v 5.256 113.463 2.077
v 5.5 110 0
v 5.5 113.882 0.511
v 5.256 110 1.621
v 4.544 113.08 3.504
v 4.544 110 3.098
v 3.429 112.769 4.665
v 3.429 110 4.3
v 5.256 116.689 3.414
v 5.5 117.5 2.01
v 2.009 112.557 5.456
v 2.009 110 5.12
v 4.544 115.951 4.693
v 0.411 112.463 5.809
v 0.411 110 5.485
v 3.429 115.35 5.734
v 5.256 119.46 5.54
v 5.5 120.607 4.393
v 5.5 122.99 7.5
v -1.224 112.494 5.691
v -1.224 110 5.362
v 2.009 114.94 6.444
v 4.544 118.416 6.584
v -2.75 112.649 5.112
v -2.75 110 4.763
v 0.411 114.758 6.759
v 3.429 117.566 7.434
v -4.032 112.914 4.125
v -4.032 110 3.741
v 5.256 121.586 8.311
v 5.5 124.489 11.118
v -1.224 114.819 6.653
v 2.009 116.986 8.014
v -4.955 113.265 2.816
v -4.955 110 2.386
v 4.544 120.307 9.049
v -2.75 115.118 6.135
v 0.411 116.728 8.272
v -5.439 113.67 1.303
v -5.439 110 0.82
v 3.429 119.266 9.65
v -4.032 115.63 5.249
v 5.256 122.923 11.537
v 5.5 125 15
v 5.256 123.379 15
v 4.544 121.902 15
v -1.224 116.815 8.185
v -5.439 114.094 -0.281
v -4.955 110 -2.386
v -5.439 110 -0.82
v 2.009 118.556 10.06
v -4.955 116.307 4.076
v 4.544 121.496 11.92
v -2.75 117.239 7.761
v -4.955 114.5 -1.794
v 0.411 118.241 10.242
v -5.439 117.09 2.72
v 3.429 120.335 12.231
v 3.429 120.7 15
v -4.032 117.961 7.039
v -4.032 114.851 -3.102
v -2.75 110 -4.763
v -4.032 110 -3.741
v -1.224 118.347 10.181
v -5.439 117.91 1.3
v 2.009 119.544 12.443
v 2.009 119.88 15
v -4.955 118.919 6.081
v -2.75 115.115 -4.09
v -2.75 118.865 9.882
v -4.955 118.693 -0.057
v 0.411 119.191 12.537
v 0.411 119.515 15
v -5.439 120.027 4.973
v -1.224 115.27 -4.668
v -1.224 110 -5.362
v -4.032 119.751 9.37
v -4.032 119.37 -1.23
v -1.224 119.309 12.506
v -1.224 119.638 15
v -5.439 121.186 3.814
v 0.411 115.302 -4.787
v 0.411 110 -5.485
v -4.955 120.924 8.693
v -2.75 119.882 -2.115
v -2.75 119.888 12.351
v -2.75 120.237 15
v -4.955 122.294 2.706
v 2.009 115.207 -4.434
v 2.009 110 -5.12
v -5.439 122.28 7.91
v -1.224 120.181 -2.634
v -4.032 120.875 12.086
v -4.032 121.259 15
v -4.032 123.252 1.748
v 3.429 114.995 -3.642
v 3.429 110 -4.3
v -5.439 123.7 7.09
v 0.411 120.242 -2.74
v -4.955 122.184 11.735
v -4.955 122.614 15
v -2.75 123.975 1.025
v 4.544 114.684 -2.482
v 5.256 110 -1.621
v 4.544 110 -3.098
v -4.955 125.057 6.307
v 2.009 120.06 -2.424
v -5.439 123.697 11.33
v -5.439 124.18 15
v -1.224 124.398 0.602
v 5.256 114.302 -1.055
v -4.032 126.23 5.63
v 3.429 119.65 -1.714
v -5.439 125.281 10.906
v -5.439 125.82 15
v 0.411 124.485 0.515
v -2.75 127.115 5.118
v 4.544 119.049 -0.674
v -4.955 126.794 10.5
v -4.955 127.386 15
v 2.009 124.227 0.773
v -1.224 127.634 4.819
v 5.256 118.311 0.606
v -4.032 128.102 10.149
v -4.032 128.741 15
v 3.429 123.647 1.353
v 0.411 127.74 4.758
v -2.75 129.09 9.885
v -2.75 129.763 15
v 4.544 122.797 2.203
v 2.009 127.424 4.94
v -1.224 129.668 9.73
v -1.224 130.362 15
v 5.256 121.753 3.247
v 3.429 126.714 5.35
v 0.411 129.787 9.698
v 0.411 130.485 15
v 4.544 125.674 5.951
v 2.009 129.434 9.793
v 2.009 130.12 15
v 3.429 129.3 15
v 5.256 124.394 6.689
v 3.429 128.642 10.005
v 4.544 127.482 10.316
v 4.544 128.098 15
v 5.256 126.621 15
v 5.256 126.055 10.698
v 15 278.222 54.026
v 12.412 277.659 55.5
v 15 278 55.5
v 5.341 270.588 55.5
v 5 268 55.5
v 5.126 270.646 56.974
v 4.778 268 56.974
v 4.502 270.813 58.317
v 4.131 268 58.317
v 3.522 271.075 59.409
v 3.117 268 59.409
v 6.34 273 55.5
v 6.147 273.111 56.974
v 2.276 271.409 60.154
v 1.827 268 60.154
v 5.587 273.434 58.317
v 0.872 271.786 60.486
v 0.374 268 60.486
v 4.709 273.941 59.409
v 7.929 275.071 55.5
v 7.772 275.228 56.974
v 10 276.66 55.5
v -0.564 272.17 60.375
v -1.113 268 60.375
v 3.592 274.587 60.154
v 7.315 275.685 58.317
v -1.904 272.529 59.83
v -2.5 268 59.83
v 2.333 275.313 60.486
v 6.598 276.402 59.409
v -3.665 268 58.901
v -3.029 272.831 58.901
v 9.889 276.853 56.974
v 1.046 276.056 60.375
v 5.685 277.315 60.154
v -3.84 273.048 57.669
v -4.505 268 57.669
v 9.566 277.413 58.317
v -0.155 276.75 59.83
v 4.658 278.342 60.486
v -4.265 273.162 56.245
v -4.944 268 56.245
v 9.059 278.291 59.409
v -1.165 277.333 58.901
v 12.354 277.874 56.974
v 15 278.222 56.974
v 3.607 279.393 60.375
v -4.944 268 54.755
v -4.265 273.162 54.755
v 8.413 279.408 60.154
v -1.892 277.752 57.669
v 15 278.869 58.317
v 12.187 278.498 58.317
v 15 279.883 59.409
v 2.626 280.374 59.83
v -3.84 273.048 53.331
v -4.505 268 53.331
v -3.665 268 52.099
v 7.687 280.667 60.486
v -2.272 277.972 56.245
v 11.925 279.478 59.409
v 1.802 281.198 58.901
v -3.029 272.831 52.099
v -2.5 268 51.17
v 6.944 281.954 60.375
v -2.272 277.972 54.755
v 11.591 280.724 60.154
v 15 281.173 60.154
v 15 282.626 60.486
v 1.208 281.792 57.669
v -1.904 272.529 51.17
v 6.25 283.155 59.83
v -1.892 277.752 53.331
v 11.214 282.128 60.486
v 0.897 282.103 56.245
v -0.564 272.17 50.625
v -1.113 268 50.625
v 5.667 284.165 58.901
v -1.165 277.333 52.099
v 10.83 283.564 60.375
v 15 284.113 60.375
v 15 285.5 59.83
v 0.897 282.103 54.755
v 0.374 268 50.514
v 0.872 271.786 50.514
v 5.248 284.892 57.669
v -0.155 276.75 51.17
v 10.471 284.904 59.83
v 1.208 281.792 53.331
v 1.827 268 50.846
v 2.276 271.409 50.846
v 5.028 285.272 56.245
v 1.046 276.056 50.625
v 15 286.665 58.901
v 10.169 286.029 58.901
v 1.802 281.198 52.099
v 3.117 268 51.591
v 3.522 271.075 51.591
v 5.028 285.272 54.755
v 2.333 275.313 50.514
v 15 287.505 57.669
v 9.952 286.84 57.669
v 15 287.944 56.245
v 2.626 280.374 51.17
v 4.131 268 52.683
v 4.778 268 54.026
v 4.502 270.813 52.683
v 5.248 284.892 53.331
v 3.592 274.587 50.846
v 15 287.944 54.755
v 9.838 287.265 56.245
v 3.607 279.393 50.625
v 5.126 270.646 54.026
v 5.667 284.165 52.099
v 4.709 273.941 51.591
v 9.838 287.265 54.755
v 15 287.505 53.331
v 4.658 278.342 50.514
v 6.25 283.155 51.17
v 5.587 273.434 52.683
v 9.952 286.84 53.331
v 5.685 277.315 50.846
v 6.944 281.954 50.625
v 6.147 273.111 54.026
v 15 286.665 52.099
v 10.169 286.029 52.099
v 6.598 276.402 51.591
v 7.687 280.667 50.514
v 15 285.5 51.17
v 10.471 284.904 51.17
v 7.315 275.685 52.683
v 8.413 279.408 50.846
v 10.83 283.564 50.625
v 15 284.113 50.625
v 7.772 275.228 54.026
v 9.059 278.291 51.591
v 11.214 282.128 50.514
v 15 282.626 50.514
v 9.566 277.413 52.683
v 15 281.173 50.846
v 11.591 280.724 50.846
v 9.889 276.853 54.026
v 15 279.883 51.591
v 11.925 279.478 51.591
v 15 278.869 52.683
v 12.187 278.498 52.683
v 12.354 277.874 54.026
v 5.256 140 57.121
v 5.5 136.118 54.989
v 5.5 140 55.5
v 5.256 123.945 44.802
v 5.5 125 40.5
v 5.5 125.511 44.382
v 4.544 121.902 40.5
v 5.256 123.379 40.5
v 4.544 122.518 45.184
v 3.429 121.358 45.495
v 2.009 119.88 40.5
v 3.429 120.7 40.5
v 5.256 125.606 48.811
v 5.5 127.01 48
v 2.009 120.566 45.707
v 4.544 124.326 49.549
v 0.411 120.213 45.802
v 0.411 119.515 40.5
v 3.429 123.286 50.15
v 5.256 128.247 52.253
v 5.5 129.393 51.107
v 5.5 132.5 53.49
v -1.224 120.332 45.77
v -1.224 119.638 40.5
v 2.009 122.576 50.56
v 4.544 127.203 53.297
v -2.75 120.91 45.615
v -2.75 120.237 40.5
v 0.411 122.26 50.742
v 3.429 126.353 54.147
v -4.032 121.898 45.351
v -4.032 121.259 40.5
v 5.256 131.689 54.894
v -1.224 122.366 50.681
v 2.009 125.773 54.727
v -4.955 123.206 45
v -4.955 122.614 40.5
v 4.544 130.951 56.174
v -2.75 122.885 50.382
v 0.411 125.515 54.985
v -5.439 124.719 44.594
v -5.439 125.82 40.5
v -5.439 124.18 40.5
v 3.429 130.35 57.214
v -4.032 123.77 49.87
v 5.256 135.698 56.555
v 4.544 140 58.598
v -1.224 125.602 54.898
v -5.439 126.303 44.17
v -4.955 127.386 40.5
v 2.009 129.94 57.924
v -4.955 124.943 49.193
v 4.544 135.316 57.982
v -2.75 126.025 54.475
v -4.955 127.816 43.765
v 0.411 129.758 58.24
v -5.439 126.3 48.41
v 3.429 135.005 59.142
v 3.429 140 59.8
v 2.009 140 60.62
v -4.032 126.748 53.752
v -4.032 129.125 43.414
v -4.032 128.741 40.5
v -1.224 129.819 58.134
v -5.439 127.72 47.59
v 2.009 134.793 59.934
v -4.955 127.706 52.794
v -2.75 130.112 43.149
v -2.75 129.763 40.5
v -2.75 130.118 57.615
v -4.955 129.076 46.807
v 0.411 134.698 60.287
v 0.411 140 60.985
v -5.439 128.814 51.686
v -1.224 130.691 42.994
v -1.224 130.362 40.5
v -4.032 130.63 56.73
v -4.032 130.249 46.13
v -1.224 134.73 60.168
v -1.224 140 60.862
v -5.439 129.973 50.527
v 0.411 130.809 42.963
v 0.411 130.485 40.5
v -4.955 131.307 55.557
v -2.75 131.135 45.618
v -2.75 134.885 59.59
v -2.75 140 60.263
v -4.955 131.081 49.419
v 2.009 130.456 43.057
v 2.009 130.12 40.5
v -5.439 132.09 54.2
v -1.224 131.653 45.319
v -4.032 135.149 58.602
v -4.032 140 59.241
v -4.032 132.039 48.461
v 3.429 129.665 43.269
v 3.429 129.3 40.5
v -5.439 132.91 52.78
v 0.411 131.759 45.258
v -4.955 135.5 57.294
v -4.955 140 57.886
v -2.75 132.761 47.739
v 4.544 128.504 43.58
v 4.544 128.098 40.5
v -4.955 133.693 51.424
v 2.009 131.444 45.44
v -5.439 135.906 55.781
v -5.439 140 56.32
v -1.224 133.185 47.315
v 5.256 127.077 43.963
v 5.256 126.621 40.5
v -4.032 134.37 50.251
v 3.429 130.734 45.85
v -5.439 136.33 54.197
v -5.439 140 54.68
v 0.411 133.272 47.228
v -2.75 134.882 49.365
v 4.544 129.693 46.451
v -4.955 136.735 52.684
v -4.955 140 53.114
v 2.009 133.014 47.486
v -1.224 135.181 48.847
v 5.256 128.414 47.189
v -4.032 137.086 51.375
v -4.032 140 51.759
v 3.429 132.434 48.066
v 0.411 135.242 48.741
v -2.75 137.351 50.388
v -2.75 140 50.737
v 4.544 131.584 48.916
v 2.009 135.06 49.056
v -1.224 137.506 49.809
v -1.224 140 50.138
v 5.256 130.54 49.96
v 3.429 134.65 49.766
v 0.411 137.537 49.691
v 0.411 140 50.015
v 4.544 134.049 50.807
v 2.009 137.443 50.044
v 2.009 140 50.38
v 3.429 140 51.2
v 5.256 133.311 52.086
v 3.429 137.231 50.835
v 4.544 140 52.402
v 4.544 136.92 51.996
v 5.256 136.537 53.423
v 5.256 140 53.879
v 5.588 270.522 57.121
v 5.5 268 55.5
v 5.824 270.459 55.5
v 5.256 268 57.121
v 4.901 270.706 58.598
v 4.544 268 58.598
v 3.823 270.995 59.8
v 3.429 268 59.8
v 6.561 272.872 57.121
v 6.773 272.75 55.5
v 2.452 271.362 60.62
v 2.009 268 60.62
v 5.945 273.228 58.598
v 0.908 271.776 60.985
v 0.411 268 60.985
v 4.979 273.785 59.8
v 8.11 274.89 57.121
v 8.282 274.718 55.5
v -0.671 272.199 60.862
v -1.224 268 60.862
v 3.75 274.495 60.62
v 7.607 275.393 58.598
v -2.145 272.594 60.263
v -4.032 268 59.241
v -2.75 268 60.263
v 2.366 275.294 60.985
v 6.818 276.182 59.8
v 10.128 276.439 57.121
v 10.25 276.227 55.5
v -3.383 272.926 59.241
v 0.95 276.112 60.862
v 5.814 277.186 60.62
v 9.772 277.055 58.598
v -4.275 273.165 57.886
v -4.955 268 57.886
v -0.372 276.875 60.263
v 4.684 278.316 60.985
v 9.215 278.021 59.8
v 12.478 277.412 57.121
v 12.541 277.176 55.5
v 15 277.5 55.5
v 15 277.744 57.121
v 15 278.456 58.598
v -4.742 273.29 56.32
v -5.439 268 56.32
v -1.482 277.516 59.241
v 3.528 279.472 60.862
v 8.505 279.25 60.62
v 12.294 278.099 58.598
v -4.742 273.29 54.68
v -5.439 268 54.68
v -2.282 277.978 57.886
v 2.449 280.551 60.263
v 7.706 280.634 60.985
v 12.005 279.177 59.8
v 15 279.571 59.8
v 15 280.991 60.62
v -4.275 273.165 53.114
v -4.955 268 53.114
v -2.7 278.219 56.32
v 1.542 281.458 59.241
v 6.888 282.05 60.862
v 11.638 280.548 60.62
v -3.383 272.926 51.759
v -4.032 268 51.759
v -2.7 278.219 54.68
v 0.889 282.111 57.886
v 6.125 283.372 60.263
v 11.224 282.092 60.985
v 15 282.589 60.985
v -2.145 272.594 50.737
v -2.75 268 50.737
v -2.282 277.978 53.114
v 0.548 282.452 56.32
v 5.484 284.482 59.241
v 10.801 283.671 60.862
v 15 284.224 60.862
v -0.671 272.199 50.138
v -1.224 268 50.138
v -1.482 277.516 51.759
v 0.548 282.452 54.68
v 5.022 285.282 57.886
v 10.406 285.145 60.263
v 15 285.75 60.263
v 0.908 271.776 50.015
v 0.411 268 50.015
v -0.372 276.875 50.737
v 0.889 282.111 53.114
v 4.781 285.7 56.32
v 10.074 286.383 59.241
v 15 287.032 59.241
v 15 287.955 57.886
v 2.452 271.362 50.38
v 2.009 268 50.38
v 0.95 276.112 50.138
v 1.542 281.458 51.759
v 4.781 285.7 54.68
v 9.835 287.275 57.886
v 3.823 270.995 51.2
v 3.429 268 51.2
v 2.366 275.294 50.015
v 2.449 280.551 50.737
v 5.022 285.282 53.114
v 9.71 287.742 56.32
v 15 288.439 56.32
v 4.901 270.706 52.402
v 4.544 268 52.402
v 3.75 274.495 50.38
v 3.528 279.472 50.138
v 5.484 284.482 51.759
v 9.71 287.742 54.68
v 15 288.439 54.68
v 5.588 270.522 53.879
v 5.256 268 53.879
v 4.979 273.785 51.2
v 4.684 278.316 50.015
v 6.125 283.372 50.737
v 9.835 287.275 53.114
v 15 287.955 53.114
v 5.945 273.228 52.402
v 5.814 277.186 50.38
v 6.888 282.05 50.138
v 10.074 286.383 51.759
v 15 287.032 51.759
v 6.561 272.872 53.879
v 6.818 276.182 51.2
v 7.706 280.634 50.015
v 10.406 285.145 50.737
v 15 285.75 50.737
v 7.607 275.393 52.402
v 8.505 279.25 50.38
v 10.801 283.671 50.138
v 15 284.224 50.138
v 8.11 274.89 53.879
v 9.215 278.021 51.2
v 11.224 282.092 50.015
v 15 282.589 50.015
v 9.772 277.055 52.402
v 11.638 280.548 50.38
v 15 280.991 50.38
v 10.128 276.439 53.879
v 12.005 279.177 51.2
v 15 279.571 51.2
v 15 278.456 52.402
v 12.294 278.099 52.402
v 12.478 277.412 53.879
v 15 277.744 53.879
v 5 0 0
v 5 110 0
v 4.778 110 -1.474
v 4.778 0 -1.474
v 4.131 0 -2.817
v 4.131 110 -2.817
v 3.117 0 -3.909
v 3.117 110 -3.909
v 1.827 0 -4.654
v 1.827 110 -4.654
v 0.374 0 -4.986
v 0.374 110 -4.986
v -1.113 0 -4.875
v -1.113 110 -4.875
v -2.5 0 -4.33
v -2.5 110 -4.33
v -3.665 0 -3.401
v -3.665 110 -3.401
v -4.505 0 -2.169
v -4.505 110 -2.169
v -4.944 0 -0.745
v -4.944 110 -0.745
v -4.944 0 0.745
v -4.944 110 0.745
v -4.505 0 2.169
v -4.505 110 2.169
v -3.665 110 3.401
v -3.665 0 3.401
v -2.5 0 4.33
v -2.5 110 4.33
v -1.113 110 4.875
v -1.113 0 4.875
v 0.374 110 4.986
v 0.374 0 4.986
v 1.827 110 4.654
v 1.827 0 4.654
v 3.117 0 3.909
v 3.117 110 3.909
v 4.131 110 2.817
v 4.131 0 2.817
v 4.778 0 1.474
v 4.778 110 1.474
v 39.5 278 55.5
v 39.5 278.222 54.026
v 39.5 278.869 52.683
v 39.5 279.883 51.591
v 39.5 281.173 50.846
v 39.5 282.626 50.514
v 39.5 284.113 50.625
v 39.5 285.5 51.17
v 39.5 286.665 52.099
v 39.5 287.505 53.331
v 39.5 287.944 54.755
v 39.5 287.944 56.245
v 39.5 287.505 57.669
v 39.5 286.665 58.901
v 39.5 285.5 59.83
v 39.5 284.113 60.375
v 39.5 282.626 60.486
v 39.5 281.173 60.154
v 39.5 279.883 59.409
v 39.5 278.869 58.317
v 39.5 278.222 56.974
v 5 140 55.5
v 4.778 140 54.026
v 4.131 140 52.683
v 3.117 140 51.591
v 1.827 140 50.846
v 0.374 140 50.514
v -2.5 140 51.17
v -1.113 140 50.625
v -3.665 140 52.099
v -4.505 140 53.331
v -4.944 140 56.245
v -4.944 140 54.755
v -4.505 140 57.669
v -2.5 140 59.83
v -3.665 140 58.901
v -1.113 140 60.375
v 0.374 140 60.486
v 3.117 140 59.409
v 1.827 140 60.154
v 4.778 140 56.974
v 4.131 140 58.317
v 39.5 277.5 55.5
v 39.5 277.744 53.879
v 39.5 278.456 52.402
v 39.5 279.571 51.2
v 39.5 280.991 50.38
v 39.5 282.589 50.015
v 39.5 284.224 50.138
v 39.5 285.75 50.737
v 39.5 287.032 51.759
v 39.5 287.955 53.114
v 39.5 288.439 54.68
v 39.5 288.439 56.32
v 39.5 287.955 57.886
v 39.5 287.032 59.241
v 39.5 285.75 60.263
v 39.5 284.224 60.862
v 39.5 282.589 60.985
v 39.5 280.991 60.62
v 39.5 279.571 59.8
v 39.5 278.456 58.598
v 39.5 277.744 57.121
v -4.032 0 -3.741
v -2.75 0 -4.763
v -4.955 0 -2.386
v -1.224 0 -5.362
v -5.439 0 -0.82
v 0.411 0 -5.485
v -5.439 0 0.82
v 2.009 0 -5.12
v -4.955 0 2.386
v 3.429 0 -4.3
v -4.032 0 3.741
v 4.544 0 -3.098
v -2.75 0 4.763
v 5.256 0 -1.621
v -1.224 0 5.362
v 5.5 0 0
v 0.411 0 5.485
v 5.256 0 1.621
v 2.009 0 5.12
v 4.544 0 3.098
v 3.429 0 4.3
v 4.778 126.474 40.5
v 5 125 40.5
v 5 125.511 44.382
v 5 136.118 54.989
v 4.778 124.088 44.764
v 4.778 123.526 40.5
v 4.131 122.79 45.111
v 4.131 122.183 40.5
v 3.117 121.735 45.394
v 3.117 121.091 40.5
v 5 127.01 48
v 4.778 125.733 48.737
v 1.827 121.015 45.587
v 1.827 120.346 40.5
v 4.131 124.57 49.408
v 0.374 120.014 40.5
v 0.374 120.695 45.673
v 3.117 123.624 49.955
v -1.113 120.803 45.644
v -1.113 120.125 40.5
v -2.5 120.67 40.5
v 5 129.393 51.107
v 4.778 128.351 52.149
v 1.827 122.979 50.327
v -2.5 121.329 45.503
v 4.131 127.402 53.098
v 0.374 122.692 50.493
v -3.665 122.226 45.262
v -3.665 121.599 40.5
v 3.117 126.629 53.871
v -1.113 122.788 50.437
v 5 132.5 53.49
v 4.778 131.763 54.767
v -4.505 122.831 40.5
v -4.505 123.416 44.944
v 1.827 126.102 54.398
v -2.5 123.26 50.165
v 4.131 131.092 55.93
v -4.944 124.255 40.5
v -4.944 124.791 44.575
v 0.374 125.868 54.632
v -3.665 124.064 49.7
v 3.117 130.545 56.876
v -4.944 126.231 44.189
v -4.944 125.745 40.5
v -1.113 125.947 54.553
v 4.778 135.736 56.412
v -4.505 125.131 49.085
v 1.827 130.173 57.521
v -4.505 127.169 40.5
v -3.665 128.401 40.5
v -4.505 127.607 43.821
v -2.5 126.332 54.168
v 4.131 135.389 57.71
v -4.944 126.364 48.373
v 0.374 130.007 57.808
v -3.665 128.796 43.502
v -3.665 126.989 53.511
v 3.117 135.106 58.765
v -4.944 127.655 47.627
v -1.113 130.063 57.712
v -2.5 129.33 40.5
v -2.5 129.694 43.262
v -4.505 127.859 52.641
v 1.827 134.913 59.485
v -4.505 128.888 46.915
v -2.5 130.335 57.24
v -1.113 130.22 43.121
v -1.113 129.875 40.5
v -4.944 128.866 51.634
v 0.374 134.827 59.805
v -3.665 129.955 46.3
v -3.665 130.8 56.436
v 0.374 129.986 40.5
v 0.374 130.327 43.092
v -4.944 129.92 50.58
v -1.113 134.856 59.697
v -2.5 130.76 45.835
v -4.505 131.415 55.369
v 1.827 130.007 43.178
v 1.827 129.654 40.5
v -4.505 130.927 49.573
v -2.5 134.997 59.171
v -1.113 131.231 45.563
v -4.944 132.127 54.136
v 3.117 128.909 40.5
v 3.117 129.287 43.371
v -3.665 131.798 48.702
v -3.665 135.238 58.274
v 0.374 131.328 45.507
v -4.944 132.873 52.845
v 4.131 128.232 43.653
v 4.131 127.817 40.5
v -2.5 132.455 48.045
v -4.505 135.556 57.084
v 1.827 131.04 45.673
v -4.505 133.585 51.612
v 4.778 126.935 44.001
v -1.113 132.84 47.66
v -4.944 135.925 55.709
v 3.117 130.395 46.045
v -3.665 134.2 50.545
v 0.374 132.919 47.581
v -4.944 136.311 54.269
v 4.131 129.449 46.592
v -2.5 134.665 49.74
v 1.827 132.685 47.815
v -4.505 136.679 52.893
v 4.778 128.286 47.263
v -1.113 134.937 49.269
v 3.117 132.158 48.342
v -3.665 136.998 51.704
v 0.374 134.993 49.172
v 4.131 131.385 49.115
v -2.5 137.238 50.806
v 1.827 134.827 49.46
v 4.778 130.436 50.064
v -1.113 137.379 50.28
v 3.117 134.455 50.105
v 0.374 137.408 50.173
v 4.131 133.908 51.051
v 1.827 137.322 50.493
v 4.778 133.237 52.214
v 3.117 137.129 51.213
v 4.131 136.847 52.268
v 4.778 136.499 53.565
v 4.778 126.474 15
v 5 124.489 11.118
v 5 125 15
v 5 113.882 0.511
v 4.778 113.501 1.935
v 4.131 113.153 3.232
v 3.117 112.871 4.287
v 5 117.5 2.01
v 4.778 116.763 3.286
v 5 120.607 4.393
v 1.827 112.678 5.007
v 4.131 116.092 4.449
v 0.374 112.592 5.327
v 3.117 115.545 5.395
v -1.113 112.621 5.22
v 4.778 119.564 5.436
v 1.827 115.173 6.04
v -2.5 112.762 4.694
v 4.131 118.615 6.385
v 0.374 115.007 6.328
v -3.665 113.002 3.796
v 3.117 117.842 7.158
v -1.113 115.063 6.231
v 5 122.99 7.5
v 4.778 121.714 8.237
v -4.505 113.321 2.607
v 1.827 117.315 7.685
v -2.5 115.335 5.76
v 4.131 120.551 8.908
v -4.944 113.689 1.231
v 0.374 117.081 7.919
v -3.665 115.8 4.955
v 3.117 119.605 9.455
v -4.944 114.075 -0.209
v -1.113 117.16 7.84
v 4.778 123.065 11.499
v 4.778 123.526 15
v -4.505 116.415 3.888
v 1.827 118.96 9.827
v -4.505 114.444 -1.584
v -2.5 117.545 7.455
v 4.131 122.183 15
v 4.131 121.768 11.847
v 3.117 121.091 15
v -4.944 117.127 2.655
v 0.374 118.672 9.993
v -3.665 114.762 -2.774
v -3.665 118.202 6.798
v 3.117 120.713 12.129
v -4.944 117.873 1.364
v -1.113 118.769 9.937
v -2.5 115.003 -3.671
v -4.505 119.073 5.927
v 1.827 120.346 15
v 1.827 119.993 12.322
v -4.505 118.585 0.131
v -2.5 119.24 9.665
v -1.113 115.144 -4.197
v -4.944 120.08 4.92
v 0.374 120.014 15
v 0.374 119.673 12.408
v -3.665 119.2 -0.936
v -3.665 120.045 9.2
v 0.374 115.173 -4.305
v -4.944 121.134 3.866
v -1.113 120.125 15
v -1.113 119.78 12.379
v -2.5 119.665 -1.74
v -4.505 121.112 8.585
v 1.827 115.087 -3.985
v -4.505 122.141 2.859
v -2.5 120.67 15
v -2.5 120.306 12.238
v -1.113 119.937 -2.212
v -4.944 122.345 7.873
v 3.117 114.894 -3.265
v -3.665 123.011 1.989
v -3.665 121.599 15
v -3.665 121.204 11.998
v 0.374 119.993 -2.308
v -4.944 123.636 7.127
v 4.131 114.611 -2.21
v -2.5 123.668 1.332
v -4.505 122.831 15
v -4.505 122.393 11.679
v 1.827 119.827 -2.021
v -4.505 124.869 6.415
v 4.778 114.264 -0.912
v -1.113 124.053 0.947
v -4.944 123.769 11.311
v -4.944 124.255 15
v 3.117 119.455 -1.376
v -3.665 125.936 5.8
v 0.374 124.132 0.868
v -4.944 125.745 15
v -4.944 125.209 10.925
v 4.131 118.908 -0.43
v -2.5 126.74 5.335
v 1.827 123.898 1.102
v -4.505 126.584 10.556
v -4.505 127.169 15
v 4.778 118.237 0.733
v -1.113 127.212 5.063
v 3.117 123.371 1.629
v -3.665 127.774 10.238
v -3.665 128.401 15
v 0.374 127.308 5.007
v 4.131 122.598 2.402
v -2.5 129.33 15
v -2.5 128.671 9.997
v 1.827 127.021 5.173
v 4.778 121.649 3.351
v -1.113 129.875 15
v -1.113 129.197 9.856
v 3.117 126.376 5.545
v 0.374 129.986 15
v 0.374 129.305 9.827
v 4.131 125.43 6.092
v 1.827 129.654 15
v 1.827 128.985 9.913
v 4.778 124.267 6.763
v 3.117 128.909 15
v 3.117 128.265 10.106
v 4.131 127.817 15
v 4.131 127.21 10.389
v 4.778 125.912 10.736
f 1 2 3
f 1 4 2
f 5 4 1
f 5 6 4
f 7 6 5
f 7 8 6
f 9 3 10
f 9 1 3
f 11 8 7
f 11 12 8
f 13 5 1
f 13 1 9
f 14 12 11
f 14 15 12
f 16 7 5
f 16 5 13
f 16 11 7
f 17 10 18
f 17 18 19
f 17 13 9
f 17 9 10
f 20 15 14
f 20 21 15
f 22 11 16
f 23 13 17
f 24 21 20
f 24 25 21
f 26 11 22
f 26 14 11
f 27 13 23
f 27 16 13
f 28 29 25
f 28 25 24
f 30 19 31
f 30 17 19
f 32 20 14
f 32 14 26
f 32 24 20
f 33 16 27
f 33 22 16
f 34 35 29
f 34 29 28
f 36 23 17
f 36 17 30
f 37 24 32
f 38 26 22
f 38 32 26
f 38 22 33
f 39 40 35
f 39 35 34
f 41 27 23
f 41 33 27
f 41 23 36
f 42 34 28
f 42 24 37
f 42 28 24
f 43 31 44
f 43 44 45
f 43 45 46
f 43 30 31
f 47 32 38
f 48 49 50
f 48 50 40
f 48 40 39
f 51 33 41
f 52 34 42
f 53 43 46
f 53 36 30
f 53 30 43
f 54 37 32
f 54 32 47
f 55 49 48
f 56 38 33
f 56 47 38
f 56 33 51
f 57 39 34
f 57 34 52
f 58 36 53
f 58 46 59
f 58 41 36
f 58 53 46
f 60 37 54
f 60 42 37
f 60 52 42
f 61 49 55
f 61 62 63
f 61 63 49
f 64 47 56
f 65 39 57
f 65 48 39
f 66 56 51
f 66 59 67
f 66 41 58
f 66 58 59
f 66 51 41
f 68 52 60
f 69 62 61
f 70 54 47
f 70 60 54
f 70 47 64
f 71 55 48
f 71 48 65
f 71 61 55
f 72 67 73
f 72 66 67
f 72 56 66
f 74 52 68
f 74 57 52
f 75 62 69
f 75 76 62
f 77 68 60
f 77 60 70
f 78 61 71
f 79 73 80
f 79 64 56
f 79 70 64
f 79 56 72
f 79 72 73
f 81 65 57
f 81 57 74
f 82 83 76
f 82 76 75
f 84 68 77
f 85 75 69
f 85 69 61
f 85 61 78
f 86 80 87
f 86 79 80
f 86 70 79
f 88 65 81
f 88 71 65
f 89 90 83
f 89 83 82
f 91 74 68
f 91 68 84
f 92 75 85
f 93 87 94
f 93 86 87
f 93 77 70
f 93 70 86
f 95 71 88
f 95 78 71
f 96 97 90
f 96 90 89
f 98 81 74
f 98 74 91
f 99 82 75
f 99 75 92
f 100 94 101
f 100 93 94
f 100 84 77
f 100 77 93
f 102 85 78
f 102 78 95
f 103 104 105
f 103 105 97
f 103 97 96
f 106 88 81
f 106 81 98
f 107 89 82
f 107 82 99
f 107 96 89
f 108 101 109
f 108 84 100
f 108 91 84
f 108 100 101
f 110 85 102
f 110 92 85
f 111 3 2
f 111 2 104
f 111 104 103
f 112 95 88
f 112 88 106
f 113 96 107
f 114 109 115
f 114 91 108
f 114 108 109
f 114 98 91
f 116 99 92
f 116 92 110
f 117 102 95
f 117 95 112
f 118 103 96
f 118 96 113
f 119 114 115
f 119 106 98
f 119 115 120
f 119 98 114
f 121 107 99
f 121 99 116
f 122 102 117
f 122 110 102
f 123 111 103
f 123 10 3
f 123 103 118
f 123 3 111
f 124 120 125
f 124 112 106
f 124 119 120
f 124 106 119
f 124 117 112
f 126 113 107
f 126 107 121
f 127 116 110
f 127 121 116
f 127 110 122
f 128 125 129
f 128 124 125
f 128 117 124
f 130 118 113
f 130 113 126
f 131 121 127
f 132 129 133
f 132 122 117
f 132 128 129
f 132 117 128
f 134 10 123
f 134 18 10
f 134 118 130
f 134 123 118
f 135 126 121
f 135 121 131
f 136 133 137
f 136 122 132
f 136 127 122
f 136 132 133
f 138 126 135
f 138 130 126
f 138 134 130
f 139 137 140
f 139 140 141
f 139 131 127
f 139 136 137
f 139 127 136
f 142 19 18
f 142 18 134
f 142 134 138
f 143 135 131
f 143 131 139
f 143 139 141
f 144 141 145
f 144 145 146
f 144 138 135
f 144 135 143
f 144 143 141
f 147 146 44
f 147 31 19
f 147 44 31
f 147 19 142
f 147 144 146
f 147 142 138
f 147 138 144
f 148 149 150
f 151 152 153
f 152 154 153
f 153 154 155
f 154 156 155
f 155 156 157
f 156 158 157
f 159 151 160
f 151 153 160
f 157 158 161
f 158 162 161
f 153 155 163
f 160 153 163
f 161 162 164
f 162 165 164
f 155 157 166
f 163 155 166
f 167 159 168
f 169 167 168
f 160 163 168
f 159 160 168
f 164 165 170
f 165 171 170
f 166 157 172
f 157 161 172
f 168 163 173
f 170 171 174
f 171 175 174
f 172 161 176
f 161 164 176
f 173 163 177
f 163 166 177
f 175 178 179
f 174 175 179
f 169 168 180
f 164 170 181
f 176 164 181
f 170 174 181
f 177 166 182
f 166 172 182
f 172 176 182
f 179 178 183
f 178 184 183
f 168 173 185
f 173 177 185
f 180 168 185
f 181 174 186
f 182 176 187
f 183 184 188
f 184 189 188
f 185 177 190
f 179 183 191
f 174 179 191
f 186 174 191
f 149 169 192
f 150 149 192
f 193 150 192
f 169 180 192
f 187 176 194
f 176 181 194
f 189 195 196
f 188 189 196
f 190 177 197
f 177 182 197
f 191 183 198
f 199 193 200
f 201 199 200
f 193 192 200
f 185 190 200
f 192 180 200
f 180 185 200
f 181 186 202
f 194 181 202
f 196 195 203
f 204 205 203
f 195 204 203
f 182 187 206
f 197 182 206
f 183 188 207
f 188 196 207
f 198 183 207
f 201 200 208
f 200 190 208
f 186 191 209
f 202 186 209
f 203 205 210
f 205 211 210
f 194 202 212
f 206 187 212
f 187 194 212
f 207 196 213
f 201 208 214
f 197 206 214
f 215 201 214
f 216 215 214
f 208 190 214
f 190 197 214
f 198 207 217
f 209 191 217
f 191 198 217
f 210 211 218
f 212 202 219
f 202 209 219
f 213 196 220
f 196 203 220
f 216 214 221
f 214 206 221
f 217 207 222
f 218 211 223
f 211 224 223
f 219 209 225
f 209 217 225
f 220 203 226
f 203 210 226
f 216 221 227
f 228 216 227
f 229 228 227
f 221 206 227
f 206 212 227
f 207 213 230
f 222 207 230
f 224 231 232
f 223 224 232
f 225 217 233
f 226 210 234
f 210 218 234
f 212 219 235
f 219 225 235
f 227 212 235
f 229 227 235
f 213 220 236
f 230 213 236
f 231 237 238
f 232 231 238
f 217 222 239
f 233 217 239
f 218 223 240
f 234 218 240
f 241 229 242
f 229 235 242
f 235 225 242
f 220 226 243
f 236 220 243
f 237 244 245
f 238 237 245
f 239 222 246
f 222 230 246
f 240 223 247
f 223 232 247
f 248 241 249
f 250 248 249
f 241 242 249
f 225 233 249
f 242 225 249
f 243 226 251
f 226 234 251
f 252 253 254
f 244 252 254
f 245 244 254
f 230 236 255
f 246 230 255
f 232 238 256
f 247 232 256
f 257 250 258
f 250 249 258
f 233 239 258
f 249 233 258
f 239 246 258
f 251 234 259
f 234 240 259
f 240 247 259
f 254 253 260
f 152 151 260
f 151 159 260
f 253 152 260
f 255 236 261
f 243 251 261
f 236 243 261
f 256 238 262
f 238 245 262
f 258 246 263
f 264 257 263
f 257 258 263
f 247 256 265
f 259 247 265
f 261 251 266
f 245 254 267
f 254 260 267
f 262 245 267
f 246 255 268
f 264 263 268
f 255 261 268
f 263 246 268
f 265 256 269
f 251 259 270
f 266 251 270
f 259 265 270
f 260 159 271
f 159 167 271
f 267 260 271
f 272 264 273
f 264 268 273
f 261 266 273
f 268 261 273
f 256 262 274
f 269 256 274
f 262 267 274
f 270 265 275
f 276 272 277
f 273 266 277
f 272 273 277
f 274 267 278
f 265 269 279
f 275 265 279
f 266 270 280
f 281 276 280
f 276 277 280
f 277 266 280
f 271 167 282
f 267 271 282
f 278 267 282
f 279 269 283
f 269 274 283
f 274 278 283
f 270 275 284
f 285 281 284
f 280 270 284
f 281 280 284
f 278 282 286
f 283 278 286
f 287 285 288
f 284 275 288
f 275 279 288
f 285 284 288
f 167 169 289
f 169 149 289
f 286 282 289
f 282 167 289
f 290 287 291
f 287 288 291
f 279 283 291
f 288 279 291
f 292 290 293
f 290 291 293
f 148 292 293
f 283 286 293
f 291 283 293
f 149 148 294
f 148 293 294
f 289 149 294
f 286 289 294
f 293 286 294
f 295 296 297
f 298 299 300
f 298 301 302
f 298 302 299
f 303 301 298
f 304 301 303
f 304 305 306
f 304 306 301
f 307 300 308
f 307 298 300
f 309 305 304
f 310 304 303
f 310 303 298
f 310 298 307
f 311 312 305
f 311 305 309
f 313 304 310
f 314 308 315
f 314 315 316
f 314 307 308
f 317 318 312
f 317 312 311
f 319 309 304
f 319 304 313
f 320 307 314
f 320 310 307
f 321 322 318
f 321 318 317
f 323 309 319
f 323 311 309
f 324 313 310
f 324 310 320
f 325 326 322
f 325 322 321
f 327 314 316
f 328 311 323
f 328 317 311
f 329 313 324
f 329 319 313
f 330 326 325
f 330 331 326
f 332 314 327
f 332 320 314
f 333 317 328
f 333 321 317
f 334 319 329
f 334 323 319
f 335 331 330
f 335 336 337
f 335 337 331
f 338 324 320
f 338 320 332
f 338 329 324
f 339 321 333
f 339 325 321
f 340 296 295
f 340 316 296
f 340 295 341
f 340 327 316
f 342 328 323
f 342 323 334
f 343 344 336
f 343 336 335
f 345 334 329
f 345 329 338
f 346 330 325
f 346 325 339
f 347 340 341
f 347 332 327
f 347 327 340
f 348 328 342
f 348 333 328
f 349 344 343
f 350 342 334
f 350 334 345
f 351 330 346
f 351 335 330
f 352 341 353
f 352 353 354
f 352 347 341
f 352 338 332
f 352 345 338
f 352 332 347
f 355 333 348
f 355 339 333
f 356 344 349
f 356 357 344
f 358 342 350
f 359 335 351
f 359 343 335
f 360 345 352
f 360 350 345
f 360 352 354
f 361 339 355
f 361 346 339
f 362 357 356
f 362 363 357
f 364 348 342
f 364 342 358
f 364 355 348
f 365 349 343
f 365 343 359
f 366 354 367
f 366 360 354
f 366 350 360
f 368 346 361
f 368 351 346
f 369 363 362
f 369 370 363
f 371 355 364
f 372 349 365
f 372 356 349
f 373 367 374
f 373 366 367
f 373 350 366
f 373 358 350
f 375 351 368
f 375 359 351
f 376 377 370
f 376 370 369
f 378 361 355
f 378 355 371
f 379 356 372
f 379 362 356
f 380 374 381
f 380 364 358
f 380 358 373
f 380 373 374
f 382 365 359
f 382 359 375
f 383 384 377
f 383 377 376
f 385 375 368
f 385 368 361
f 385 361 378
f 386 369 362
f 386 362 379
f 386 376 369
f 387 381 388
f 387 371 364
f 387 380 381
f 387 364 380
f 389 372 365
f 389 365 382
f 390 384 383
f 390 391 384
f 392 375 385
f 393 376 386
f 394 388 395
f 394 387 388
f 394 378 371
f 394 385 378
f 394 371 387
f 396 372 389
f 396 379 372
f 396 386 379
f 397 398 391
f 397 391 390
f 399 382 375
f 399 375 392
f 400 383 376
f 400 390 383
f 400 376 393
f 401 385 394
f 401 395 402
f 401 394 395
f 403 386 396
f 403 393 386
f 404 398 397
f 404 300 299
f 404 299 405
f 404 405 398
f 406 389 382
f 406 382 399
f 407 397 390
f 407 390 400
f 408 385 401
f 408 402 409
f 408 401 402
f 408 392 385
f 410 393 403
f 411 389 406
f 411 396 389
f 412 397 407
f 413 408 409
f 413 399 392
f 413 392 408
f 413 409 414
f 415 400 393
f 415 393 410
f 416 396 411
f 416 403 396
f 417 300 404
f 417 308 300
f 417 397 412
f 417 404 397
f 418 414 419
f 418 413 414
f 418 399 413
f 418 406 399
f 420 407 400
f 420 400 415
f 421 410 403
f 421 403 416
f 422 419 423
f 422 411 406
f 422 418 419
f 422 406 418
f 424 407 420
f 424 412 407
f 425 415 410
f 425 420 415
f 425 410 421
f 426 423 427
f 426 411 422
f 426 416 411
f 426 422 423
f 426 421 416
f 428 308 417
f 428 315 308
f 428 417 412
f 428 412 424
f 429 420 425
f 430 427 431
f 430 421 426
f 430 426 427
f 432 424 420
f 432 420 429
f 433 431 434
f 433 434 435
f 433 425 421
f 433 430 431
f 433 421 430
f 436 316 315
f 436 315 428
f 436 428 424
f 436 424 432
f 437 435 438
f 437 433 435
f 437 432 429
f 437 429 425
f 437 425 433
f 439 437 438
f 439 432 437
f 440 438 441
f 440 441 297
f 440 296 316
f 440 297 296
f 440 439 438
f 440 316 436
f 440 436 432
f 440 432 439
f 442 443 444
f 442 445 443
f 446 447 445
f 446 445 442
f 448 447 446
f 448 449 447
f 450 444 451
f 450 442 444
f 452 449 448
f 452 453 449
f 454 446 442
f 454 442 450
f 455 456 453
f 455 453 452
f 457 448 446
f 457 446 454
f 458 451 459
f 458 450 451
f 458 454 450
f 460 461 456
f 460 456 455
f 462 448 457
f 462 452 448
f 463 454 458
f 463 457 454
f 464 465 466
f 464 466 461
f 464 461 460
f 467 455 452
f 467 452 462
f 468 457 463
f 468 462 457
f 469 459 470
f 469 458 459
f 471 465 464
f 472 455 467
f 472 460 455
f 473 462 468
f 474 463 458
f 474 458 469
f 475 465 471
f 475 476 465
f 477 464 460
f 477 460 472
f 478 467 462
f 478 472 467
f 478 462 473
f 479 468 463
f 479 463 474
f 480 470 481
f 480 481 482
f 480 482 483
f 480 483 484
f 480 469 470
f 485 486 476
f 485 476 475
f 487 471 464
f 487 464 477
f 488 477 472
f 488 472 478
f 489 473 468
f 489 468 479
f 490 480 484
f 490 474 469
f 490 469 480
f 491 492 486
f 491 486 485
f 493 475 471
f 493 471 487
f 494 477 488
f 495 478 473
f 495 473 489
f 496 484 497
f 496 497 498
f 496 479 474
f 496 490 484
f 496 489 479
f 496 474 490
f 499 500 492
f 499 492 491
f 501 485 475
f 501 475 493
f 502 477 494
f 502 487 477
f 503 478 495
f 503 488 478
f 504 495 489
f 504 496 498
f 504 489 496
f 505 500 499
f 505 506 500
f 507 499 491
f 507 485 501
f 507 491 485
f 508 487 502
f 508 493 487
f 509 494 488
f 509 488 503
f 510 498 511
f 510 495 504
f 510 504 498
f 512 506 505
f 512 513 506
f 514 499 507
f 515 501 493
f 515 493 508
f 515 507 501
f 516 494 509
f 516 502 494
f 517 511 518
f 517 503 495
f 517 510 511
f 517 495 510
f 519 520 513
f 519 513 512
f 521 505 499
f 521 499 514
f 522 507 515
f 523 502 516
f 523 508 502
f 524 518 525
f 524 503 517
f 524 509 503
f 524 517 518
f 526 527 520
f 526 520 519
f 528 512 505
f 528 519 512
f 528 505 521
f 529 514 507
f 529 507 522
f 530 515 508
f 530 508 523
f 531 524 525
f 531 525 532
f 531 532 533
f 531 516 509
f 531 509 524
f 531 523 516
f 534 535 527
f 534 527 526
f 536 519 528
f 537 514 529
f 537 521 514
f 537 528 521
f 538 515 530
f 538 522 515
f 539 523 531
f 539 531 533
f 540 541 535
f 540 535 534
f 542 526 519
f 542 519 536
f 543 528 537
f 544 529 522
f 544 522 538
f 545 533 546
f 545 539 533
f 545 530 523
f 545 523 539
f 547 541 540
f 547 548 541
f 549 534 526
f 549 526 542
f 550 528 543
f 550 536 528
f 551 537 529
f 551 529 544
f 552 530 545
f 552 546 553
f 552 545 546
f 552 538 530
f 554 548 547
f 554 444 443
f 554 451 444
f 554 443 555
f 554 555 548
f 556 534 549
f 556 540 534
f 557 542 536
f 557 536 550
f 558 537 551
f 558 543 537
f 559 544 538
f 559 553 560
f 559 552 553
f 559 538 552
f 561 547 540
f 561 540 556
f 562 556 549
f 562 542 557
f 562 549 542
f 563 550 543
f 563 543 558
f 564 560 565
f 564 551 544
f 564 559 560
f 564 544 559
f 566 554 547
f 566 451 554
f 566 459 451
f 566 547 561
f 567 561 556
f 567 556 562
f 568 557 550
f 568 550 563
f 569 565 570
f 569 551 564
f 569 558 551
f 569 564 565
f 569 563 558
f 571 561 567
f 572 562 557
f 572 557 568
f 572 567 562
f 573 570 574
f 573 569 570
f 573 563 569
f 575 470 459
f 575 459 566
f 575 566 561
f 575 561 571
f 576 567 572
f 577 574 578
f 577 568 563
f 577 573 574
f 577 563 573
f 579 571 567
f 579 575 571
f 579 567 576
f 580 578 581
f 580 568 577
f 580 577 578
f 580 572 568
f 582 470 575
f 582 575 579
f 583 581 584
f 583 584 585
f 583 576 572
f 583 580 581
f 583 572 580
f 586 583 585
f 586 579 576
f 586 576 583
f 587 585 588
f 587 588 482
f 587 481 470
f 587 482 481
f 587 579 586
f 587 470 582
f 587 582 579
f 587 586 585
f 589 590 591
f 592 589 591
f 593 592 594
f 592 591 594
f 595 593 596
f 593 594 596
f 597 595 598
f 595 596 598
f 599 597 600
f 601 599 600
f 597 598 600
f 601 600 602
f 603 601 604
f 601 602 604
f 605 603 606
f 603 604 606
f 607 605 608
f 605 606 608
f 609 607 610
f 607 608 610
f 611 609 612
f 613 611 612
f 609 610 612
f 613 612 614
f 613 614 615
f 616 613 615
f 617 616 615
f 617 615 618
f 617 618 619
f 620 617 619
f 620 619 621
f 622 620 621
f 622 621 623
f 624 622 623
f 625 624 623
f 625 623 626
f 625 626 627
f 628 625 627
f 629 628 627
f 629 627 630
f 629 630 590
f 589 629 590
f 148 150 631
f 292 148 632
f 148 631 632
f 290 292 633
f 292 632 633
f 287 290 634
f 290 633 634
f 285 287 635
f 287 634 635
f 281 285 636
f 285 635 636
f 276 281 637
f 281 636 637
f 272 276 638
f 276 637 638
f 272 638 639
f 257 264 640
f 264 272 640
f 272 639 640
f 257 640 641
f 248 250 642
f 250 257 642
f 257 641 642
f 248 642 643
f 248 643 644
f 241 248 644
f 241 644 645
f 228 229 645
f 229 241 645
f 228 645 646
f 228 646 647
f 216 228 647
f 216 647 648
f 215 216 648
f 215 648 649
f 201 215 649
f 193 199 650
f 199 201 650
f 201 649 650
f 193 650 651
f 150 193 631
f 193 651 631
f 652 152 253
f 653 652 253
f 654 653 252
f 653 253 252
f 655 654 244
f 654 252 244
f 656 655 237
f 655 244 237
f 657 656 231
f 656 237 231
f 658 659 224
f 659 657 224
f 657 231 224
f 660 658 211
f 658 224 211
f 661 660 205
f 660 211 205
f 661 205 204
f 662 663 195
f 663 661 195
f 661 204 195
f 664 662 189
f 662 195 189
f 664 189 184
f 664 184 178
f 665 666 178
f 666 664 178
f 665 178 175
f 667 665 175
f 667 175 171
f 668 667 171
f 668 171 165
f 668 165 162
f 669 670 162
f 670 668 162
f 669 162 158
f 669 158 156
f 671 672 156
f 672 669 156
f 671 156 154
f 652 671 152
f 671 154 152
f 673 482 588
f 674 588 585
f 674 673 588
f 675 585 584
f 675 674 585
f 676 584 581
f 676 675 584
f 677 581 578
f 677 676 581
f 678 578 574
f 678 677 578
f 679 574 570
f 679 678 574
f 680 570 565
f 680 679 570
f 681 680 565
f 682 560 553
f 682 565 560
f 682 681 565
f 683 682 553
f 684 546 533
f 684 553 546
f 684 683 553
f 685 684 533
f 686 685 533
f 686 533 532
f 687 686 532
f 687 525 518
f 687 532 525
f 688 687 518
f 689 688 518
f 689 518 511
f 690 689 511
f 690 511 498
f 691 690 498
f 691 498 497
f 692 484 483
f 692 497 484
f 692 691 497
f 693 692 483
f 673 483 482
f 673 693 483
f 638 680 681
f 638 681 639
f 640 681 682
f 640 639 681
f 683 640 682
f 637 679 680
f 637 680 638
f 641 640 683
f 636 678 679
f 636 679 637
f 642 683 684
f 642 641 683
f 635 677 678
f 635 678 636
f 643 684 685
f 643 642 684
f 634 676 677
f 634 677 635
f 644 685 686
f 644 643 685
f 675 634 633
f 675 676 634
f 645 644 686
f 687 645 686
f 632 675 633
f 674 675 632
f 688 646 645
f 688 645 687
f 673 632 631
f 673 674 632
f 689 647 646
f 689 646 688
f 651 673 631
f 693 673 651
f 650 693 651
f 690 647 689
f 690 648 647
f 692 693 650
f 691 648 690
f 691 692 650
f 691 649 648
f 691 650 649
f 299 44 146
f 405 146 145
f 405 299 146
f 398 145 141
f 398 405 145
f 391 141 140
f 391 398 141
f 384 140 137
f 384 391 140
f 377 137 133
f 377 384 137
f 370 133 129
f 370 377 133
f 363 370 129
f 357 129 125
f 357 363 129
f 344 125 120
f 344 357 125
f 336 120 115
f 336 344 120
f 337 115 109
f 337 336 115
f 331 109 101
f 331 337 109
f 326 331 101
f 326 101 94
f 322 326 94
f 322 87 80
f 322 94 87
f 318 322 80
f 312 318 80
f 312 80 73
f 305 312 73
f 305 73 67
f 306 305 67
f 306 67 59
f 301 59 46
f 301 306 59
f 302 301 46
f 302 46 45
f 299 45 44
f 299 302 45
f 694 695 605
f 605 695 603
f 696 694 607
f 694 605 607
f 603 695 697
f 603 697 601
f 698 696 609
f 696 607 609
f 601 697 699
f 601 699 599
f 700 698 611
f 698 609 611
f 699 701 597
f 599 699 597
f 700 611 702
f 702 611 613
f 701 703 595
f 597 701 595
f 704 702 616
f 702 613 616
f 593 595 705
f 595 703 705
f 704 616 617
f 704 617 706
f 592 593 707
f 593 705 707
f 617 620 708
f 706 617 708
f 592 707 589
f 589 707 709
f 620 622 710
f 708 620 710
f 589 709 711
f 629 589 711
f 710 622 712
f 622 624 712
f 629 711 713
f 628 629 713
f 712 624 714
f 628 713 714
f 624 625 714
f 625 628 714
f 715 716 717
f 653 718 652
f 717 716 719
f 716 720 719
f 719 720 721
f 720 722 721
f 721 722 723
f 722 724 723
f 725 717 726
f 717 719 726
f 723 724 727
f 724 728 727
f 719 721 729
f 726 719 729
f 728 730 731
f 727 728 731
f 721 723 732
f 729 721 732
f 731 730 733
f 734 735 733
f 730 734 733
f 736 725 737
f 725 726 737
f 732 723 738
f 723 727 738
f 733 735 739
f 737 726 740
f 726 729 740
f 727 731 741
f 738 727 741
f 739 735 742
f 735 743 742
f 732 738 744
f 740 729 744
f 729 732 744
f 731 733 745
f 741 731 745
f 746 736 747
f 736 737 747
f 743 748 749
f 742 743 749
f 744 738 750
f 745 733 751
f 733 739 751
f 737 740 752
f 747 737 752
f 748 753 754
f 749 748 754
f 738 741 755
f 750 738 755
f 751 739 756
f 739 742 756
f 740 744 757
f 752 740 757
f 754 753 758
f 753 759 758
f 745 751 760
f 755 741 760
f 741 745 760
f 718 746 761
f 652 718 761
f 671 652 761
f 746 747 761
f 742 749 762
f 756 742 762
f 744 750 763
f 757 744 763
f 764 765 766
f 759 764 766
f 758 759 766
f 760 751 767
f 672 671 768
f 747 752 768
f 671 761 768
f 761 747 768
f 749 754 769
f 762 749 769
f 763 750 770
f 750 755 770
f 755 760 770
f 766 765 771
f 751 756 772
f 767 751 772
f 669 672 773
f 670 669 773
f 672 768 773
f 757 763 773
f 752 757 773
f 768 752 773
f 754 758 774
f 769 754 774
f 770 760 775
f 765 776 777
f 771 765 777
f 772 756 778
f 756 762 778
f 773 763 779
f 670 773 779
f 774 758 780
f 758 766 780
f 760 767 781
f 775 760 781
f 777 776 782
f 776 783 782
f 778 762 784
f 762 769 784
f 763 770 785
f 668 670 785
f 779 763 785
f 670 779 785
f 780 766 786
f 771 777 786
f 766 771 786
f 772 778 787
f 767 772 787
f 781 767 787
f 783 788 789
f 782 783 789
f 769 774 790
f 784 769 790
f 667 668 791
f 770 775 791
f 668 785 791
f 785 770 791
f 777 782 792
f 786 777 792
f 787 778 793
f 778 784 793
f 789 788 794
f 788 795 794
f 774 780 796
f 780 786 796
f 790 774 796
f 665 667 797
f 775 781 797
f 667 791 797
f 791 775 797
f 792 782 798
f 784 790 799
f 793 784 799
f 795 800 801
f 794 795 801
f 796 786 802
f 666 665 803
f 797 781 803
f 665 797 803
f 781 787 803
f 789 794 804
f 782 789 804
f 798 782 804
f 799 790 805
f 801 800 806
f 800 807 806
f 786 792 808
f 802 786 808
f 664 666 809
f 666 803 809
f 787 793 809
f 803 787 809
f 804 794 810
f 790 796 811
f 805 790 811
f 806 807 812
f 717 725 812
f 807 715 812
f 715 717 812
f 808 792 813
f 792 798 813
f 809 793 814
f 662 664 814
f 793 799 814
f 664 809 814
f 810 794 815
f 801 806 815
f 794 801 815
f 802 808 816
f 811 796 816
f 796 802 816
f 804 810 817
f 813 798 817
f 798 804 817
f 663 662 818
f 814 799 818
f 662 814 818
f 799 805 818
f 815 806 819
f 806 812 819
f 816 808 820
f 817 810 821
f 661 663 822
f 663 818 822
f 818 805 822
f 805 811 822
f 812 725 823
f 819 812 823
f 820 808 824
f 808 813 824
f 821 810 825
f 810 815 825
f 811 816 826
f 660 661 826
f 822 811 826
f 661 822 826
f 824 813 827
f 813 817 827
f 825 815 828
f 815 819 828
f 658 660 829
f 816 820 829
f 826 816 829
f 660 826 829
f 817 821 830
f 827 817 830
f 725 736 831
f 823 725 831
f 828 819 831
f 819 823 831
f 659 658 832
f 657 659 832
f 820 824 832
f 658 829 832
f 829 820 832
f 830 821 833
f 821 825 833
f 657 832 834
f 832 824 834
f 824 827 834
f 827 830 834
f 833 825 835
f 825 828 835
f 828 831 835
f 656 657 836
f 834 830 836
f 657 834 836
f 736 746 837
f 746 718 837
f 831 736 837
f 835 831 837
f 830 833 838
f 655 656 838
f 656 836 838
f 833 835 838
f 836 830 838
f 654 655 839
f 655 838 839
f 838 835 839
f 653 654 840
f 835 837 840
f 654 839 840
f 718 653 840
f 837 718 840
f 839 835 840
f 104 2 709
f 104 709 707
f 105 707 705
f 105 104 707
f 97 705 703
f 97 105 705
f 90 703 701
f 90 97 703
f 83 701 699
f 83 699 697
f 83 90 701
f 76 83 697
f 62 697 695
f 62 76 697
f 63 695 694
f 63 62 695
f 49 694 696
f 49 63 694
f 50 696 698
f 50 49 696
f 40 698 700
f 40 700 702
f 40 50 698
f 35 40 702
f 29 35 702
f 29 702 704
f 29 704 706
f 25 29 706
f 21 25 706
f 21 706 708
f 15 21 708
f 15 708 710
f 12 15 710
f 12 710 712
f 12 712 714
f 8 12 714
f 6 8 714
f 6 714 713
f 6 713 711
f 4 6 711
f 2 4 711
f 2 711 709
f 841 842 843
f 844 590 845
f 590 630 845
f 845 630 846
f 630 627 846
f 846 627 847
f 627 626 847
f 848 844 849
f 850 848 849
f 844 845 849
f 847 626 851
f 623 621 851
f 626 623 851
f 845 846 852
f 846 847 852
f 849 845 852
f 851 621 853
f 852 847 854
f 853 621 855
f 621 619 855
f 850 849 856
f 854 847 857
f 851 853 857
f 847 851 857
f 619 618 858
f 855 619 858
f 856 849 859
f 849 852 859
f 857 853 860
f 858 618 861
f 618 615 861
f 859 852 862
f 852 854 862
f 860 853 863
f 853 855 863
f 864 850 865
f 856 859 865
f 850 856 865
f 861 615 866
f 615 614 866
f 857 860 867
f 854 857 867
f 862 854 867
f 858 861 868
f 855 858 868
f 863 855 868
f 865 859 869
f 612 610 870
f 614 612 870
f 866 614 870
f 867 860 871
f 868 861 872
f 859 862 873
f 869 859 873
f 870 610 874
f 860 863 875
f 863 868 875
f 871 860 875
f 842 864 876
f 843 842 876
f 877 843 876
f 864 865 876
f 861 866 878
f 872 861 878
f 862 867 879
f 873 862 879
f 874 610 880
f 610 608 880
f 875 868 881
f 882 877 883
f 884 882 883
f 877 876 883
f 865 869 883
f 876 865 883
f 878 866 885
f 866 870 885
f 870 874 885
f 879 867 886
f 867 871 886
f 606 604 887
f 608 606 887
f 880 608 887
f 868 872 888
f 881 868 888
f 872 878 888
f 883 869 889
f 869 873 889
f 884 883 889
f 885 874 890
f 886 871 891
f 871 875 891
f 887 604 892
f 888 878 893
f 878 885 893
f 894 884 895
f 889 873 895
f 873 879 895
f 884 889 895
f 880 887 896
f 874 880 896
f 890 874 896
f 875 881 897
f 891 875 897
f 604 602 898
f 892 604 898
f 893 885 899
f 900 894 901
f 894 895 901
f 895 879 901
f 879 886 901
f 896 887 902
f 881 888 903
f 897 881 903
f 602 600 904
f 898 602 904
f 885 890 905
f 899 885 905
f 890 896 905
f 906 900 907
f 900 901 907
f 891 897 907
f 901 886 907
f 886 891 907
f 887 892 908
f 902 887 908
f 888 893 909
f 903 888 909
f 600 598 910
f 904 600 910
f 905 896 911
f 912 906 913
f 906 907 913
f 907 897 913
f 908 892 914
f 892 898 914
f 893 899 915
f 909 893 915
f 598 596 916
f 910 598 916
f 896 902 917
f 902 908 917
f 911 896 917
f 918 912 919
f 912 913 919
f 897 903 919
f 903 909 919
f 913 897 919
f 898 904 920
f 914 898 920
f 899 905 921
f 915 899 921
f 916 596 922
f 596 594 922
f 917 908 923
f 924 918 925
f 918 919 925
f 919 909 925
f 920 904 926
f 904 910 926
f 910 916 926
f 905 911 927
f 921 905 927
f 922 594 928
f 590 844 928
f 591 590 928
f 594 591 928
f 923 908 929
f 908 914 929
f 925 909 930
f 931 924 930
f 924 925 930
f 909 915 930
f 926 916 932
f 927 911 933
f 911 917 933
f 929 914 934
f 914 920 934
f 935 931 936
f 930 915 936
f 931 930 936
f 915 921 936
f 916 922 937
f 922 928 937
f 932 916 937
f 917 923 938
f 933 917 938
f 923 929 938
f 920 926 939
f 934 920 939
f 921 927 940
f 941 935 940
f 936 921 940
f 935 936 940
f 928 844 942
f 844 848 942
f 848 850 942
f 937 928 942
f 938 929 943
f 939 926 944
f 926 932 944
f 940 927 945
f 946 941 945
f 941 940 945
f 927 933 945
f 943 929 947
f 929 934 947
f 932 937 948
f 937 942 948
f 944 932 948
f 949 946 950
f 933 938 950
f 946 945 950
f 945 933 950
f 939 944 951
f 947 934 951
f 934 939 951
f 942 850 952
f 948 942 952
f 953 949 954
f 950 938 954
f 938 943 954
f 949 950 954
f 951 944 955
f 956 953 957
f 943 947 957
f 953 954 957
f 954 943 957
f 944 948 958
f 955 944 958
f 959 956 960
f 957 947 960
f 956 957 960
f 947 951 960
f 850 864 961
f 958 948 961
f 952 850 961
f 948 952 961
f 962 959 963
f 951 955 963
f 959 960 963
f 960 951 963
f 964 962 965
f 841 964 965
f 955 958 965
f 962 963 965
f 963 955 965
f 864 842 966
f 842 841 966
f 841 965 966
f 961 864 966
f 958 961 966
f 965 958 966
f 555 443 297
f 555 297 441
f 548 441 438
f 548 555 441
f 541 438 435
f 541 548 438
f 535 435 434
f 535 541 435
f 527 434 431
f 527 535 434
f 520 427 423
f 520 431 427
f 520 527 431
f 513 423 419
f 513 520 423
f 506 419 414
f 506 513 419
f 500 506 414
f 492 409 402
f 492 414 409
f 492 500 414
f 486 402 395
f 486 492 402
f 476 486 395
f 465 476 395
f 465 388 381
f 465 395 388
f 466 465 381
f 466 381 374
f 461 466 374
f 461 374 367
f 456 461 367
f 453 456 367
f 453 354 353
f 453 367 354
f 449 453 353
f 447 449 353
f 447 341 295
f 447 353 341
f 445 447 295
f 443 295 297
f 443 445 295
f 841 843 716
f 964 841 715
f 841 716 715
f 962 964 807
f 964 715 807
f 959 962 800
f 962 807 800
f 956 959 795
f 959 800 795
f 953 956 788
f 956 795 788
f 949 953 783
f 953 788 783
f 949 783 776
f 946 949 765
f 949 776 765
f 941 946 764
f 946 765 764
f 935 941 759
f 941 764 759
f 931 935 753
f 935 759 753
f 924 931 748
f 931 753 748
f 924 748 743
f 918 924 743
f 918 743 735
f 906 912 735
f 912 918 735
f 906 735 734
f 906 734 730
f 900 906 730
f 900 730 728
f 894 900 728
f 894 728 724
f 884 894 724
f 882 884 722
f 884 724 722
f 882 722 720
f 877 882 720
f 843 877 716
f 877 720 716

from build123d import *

# Parameters (mm, degrees)
ESQUISSE1_R   = 5.5
ESQUISSE1_R_2 = 5


with BuildPart() as part:
    # Balayage1: sweep along a curve in space
    with BuildLine() as balayage1_path:
        Line((0, 0, 0), (0, 110, 0))
        ThreePointArc((0, 110, 0), (0, 120.606601718, 4.393398282), (0, 125, 15))
        Line((0, 125, 15), (0, 125, 40.5))
        ThreePointArc((0, 125, 40.5), (0, 129.393398282, 51.106601718), (0, 140, 55.5))
        Line((0, 140, 55.5), (0, 268, 55.5))
        ThreePointArc((0, 268, 55.5), (4.393398282, 278.606601718, 55.5), (15, 283, 55.5))
        Line((15, 283, 55.5), (39.5, 283, 55.5))
    # Esquisse1 → Balayage1 (sweep)
    with BuildSketch(Plane(origin=(0, 0, 0), x_dir=(1, 0, 0), z_dir=(0, 1, 0))):
        Circle(ESQUISSE1_R)
        Circle(ESQUISSE1_R_2, mode=Mode.SUBTRACT)
    sweep(path=balayage1_path.line)


solid = part.part
